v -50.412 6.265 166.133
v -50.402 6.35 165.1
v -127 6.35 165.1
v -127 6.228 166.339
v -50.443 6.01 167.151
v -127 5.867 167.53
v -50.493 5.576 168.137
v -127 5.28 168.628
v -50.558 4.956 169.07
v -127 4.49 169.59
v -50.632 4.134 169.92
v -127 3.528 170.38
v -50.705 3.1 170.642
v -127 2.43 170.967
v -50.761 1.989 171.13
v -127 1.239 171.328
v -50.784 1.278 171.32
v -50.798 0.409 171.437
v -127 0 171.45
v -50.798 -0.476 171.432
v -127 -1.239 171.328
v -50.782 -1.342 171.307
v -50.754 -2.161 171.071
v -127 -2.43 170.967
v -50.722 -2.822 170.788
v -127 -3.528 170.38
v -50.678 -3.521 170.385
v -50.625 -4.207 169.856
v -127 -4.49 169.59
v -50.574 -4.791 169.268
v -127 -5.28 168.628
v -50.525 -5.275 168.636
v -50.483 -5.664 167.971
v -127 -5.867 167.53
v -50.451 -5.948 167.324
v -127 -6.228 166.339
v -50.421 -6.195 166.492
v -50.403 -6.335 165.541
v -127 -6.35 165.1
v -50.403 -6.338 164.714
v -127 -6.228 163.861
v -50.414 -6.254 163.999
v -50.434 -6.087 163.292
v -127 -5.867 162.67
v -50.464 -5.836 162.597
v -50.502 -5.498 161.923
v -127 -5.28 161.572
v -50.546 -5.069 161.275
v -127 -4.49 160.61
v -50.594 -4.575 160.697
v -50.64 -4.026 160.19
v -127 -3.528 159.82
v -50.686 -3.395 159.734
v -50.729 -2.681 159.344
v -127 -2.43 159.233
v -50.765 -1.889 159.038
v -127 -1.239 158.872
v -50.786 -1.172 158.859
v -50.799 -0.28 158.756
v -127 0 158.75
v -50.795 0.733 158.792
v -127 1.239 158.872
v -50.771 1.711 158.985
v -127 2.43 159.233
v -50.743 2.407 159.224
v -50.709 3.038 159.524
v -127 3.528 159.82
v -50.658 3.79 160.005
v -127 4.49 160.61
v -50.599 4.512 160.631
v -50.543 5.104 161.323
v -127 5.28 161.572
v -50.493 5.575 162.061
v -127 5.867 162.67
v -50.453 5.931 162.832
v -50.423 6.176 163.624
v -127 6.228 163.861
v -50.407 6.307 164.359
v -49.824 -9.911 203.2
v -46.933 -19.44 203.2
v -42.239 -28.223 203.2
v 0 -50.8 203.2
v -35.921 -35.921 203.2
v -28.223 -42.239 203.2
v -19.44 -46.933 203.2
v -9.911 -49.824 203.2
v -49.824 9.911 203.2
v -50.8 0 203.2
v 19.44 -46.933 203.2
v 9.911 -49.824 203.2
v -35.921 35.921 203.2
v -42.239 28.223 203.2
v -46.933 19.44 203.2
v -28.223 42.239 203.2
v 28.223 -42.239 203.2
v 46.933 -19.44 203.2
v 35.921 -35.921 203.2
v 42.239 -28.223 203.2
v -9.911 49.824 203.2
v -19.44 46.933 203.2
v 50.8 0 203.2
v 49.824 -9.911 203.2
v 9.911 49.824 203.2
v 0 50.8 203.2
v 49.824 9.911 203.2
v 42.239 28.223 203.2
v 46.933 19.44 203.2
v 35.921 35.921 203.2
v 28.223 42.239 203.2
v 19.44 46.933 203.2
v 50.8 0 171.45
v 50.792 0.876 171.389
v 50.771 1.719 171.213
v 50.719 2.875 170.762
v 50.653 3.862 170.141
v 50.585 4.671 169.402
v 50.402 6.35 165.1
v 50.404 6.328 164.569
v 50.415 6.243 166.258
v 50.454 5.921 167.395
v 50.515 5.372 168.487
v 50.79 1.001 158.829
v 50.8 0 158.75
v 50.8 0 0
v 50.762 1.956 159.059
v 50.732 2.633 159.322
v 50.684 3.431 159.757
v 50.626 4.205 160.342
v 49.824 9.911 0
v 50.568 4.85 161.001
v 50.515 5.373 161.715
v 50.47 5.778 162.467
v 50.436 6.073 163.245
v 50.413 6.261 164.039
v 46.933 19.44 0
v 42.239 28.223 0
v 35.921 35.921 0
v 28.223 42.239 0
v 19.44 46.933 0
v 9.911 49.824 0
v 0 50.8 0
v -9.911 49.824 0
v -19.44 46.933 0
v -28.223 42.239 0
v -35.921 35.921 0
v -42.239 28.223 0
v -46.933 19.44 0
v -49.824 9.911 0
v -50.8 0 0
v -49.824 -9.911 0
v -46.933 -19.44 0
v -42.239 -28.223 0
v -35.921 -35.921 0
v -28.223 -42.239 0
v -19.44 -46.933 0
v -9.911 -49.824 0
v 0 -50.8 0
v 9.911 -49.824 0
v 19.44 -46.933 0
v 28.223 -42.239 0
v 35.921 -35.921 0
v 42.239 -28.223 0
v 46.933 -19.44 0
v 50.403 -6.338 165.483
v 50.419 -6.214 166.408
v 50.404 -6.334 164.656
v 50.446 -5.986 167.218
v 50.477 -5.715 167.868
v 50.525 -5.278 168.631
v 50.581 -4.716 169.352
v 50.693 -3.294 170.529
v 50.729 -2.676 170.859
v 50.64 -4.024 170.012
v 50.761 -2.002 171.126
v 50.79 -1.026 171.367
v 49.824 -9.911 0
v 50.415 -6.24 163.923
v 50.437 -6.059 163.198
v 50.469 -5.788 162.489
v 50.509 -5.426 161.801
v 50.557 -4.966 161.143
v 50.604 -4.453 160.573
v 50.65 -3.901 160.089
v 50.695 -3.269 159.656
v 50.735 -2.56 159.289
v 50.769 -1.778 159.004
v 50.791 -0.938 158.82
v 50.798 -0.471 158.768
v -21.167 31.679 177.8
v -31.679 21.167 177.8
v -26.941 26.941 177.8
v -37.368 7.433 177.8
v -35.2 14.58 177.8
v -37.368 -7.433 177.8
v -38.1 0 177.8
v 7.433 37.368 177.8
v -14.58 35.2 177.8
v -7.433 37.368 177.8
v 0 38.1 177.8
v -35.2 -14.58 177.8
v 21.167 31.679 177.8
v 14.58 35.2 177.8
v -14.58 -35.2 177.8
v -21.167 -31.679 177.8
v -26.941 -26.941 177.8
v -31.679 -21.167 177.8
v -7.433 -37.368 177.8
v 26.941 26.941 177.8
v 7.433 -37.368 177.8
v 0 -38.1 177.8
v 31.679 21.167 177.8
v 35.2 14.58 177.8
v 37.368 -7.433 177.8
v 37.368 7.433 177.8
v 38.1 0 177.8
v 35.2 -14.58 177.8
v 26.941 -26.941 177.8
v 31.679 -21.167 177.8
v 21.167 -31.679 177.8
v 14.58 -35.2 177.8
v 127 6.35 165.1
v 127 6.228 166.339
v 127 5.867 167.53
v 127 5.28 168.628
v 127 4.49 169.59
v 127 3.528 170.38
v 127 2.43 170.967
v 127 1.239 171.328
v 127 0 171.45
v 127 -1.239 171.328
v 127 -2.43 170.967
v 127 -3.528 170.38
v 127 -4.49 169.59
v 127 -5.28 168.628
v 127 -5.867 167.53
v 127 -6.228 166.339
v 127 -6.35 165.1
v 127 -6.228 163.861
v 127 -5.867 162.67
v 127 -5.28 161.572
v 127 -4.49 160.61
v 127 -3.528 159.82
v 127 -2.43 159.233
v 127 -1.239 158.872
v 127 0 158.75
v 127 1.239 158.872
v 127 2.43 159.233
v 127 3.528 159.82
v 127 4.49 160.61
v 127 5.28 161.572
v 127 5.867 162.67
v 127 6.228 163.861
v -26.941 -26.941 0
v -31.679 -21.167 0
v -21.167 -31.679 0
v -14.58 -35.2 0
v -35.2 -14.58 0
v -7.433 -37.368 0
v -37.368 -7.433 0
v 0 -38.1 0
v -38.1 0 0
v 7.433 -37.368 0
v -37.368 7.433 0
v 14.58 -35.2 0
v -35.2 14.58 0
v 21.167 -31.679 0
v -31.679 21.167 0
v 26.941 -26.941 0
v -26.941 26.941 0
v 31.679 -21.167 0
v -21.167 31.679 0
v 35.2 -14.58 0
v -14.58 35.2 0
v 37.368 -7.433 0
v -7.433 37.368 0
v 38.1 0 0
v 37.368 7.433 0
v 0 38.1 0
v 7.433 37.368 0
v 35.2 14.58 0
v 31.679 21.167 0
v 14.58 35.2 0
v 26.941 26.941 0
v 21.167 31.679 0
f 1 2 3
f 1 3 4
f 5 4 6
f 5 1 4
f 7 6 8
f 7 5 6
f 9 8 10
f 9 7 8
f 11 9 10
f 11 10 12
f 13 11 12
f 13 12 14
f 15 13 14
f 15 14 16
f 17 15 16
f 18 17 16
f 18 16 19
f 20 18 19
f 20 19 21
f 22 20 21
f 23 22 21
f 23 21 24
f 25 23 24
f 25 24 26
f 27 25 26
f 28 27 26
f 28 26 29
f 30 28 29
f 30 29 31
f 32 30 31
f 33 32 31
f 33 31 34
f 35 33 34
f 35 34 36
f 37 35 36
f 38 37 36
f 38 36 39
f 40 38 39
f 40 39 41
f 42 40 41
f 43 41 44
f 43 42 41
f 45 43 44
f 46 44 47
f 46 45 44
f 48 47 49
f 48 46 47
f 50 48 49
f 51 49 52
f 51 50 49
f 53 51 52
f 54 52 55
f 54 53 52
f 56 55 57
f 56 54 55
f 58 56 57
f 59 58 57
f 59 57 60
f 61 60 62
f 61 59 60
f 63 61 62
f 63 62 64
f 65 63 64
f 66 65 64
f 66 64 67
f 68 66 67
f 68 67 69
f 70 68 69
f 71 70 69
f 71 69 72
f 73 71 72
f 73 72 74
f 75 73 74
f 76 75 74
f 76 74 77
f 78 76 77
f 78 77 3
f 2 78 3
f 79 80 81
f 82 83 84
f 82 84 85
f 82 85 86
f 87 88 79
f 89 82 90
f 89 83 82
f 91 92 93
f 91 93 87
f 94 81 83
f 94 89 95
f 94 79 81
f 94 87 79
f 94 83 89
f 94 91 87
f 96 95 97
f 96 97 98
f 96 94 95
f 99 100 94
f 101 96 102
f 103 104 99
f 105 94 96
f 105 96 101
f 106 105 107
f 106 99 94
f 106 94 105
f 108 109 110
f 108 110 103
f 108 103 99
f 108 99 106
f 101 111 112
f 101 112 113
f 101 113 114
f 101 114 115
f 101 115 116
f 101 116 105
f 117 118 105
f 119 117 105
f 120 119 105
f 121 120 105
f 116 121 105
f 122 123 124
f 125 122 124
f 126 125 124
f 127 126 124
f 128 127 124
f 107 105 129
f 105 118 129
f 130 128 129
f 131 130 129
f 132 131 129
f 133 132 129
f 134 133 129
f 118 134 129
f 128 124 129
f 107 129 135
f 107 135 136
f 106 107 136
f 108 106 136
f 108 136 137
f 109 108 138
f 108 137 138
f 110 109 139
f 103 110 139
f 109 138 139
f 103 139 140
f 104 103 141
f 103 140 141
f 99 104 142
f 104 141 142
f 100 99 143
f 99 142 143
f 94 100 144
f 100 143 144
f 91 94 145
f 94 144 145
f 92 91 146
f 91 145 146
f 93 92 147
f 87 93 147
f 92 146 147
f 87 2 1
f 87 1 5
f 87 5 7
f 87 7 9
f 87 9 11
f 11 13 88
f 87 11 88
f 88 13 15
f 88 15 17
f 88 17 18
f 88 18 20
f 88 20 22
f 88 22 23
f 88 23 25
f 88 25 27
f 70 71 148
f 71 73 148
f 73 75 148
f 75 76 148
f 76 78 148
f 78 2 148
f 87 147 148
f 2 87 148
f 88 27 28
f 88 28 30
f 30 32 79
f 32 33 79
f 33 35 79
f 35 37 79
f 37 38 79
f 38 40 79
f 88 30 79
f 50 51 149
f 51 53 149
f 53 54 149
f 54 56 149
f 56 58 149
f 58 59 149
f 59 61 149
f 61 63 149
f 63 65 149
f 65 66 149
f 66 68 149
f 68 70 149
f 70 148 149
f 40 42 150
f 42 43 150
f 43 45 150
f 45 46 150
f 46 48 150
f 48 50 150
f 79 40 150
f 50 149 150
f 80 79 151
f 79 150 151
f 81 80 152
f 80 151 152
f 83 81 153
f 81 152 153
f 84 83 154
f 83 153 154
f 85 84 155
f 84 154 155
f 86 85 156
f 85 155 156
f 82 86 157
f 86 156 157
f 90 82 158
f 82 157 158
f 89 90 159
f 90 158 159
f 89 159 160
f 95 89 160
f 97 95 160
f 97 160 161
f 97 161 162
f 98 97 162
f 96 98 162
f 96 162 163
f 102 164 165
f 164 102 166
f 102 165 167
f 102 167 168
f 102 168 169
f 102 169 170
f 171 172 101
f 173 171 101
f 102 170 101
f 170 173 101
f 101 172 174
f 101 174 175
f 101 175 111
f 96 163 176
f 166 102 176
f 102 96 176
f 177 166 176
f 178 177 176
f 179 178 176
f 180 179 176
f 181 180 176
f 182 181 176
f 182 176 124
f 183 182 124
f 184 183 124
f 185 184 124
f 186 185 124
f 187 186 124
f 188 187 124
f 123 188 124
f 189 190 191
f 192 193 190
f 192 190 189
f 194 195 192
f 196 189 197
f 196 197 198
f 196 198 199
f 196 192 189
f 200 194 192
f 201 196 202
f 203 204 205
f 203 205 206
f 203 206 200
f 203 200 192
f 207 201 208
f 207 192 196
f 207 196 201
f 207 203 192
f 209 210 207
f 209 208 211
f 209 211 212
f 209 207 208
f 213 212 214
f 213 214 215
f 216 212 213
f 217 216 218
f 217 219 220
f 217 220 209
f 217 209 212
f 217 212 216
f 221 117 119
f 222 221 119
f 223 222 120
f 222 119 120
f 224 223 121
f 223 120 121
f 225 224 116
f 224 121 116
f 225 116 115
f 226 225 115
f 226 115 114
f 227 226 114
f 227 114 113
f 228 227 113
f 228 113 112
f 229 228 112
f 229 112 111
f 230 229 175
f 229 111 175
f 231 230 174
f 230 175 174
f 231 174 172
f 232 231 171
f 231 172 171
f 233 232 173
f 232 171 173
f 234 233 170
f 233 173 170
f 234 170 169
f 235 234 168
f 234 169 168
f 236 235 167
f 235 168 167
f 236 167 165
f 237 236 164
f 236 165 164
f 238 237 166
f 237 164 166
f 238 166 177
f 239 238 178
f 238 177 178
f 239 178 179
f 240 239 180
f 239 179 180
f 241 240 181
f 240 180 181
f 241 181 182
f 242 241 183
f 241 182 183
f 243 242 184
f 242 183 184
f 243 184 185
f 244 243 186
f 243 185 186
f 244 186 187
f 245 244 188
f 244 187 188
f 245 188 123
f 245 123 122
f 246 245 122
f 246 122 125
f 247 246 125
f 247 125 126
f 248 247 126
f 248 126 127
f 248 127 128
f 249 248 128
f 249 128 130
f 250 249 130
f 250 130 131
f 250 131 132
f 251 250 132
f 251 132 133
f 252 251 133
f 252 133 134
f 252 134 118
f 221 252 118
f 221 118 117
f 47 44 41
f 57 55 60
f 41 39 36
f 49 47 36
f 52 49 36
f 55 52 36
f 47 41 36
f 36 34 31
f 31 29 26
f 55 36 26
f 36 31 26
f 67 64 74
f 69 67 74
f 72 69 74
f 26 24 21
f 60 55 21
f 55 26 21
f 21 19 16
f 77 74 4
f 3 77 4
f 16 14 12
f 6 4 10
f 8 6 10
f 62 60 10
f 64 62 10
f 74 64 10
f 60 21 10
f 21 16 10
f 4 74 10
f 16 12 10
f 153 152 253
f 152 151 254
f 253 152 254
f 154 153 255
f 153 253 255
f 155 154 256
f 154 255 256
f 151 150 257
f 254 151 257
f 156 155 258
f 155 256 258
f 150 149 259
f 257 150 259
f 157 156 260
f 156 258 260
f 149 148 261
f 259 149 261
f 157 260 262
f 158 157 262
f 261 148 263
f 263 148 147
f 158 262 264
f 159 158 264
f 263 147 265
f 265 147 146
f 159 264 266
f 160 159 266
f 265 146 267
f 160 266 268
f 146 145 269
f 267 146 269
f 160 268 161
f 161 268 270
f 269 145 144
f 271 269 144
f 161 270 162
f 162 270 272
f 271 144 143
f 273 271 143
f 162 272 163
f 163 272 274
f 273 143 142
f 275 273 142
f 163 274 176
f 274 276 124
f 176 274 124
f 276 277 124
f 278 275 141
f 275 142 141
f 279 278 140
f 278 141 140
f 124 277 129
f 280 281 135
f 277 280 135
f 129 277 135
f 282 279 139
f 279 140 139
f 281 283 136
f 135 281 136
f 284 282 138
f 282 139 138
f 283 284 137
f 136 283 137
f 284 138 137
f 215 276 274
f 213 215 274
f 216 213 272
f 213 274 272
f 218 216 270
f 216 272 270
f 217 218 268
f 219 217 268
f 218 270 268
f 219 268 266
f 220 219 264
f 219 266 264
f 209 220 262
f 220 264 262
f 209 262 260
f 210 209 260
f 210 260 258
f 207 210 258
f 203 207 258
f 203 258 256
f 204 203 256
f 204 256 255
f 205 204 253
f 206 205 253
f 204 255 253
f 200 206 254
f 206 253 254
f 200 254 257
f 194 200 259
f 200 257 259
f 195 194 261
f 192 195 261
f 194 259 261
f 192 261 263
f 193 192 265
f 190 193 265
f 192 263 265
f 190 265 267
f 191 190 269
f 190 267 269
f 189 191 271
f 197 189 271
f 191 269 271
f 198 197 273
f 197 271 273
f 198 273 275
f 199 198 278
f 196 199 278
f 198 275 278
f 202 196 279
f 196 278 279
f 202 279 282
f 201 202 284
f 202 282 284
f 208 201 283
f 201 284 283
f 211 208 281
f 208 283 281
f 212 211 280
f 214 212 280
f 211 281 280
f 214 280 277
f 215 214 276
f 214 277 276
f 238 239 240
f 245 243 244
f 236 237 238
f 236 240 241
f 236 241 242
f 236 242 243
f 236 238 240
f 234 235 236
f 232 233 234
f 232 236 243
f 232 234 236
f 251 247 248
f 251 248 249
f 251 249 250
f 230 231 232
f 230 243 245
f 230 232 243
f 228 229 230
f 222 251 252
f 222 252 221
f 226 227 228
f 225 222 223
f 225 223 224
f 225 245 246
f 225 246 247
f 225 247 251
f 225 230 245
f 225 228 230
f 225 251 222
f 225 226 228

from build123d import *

# Parameters (mm, degrees)
F0_R          = 50.8
F1_DEPTH      = 203.2
F2_R          = 6.35
F3_DEPTH      = 127
F3_DEPTH_BACK = 127
F4_R          = 38.1
F5_DEPTH      = 177.8


with BuildPart() as f1:
    # F0 (on Top) → F1 (new body)
    with BuildSketch(Plane.XY):
        Circle(F0_R)
    extrude(amount=F1_DEPTH)

    # F2 (on Right) → F3 (join, two sides)
    with BuildSketch(Plane.YZ) as f3_sk:
        with Locations((0, 165.1)):
            Circle(F2_R)
    extrude(amount=F3_DEPTH)
    extrude(f3_sk.sketch, amount=-F3_DEPTH_BACK)

    # F4 (on face) → F5 (cut)
    with BuildSketch(Plane(origin=(0, 0, 0), x_dir=(1, 0, 0), z_dir=(0, 0, -1))):
        Circle(F4_R)
    extrude(amount=-F5_DEPTH, mode=Mode.SUBTRACT)


solid = f1.part
